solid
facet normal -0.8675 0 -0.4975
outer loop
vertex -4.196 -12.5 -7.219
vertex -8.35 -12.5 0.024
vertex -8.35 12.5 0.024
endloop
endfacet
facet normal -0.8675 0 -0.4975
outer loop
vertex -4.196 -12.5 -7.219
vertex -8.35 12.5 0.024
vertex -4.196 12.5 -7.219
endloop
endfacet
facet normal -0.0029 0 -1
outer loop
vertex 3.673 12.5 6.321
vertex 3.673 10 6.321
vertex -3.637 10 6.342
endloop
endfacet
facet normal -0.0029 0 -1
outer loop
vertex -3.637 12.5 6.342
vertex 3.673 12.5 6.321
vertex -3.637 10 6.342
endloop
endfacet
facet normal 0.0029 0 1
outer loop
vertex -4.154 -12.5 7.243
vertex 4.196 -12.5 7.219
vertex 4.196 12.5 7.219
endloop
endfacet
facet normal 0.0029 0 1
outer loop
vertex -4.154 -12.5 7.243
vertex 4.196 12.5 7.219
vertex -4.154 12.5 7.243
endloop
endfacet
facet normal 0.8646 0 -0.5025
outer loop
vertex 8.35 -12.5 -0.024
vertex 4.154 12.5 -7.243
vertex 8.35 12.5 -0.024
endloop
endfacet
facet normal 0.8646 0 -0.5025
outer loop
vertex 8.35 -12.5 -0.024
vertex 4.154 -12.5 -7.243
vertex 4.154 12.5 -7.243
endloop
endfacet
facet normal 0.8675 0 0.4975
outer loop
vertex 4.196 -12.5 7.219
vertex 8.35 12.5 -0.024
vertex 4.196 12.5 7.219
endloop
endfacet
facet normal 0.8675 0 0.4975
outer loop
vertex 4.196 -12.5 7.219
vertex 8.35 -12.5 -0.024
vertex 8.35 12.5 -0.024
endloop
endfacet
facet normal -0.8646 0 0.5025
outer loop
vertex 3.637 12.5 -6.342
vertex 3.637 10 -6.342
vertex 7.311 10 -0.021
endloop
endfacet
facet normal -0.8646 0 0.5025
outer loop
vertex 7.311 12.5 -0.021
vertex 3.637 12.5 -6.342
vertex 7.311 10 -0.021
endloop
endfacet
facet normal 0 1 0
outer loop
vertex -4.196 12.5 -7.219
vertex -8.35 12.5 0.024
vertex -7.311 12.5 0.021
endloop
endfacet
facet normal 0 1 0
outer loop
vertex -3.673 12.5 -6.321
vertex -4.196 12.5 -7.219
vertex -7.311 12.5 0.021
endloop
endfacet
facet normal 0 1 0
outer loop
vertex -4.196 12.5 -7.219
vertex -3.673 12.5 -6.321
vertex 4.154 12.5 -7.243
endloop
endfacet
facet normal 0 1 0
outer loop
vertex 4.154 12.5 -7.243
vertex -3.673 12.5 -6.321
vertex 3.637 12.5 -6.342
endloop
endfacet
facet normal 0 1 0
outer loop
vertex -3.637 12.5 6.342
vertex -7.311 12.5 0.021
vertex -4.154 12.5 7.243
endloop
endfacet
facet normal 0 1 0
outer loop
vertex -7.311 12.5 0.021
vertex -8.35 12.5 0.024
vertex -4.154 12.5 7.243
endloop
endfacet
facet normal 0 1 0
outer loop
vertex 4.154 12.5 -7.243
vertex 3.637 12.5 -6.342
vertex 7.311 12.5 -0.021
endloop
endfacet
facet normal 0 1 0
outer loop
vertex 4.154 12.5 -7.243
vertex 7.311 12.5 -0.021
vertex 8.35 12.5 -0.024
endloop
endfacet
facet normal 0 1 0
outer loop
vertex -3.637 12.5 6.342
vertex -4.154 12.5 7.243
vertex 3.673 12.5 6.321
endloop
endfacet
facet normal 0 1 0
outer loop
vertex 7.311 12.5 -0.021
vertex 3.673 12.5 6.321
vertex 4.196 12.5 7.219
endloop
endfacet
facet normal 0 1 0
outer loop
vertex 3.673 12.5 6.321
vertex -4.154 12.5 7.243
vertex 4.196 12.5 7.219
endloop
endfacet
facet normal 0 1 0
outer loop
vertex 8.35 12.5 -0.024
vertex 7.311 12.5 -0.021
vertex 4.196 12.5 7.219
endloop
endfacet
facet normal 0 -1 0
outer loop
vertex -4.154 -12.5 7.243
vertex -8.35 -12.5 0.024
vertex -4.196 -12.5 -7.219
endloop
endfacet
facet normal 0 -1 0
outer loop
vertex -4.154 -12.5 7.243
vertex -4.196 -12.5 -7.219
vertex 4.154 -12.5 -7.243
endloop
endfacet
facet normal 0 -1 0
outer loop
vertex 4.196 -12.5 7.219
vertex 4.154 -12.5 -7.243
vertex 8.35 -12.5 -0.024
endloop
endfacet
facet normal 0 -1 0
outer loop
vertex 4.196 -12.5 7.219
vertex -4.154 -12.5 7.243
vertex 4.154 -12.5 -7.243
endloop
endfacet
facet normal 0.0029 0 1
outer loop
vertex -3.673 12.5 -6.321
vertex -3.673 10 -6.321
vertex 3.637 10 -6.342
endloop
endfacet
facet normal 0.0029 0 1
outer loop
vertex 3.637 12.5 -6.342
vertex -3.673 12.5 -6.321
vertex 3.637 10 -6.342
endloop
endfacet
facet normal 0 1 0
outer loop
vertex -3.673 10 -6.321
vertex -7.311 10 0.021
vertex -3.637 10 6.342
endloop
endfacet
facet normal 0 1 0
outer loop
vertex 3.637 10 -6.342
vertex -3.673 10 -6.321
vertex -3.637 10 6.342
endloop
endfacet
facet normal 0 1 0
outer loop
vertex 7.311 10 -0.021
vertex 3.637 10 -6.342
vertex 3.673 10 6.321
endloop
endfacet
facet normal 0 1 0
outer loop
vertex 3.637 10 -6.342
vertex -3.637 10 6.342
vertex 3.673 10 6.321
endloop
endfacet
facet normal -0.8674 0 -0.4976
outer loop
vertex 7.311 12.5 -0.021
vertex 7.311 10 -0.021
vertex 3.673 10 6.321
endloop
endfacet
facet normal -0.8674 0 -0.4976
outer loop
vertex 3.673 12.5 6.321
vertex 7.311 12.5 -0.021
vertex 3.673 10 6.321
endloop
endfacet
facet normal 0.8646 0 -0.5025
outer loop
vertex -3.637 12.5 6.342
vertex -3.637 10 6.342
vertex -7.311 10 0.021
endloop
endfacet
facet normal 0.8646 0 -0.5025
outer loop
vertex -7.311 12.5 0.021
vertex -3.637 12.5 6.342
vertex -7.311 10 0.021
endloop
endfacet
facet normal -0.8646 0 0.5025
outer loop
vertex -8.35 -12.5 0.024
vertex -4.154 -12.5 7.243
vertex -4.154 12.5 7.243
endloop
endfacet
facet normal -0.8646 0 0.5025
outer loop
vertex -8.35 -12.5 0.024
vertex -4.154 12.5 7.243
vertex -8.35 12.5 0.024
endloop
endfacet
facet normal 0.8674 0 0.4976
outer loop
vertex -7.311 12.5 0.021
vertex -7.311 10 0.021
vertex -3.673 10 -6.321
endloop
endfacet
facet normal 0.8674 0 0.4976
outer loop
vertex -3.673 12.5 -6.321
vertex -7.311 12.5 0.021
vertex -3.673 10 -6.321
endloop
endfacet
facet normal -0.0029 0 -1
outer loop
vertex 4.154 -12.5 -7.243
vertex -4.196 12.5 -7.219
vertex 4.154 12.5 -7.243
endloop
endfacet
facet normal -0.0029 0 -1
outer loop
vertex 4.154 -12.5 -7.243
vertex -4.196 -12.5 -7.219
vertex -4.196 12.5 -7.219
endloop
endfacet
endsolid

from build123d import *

# Parameters (mm, degrees)
F1_DEPTH = 12.5
F2_T     = -0.9
F3_DEPTH = 21.6


with BuildPart() as f1:
    # F0 (on Front) → F1 (new body, symmetric)
    with BuildSketch(Plane.XZ):
        Polygon((8.3499658552, -0.0238792301), (4.1956629474, 7.2193429363), (-4.1543029077, 7.2432221663), (-8.3499658552, 0.0238792301), (-4.1956629474, -7.2193429363), (4.1543029077, -7.2432221663), align=None)
    extrude(amount=F1_DEPTH, both=True)

    # F2
    f2_openings = [f1.faces().sort_by_distance(p)[0] for p in [
        (0, 12.5, 0),
    ]]
    offset(amount=F2_T, openings=f2_openings)

    # F3 (add): a face of the model
    f3_faces = [f1.faces().sort_by_distance(p)[0] for p in [
        (0, -11.6, 0),
    ]]
    extrude(f3_faces, amount=F3_DEPTH)


solid = f1.part
